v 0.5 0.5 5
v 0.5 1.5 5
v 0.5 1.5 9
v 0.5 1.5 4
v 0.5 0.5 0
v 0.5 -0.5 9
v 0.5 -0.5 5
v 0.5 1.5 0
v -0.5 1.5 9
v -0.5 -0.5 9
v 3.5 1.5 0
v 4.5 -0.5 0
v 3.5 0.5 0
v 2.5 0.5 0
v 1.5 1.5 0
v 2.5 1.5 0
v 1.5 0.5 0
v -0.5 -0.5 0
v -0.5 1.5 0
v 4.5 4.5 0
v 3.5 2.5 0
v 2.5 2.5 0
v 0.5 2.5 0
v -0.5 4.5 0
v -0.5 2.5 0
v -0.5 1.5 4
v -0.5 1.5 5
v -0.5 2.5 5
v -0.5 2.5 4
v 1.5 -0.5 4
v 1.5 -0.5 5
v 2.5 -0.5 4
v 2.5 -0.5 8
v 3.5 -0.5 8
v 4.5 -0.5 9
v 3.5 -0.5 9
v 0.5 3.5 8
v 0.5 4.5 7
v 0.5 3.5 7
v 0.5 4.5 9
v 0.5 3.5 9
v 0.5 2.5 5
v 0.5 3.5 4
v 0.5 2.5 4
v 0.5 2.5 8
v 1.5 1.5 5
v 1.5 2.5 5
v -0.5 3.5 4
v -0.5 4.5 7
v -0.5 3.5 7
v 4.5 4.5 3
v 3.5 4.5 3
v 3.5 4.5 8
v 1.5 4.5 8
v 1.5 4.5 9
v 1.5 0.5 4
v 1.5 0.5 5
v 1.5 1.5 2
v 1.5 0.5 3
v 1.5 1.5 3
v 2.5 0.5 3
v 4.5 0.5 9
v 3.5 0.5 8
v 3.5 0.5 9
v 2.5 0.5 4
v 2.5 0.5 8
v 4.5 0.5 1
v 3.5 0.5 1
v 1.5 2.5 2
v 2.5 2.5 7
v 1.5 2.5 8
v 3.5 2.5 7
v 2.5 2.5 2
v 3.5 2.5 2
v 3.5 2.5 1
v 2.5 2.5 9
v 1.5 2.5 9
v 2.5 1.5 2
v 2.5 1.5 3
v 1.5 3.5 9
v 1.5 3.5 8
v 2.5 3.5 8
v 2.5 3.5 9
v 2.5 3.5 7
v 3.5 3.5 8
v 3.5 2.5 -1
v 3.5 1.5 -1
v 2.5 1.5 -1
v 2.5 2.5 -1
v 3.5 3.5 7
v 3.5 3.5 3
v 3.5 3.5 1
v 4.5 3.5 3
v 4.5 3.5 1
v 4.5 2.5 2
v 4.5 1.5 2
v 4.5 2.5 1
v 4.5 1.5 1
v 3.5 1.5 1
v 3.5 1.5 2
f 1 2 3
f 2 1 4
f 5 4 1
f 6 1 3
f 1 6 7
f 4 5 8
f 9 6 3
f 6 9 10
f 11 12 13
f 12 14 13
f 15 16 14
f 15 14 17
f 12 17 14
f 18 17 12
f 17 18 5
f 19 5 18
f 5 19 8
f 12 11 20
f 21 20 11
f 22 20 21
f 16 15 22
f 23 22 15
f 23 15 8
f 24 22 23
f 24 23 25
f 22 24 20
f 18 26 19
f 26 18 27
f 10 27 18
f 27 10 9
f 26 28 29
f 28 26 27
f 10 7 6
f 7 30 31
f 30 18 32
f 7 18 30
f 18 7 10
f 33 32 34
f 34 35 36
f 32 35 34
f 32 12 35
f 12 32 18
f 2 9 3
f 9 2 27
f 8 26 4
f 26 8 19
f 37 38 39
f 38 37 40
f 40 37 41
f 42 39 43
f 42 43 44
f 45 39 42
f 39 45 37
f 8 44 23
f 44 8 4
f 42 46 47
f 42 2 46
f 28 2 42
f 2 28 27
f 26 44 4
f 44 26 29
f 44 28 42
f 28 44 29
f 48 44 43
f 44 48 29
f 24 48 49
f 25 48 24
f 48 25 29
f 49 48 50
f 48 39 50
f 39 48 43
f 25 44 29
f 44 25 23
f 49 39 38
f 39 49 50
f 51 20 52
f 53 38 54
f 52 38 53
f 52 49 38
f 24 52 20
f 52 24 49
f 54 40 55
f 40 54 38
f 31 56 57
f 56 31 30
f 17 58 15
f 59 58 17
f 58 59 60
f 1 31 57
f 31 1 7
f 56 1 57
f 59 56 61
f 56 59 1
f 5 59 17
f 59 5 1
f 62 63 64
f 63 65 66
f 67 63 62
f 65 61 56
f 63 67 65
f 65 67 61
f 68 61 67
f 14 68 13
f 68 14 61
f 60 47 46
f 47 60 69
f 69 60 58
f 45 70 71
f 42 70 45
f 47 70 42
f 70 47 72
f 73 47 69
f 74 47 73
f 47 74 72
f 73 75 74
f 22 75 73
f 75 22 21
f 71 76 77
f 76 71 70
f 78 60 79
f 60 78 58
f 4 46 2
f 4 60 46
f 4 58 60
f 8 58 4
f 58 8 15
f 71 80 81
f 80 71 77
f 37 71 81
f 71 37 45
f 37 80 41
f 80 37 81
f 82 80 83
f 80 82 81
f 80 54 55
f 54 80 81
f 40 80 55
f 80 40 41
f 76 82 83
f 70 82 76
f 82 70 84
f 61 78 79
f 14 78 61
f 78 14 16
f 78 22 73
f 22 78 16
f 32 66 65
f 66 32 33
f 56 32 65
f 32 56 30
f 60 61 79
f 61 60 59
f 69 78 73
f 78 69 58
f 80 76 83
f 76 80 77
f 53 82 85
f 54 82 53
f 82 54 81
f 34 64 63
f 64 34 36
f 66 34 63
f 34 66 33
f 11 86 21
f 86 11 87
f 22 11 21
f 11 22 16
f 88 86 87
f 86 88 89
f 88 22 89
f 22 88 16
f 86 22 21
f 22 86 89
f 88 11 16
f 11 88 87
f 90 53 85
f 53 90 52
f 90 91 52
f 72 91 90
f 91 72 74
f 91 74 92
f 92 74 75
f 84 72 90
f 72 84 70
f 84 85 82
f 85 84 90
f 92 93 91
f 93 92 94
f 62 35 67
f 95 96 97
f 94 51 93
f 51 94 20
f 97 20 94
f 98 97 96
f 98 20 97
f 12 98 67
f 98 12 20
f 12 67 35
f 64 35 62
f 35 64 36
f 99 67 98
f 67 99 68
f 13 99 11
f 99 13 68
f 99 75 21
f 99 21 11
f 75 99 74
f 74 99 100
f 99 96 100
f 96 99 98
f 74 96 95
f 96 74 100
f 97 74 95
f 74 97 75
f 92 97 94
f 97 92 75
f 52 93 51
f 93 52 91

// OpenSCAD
union() {
    translate([0, 0, 4.5]) cube([1, 1, 9], center=true);
    translate([0, 1, 4.5]) cube([1, 1, 9], center=true);
    translate([0, 2, 4.5]) color([1, 0, 0]) cube([1, 1, 1], center=true);
    translate([0, 3, 2.0]) cube([1, 1, 4], center=true);
    translate([0, 4, 3.5]) cube([1, 1, 7], center=true);
    translate([1, 0, 2.5]) cube([1, 1, 5], center=true);
    translate([1, 2, 2.5]) cube([1, 1, 5], center=true);
    translate([1, 3, 4.0]) cube([1, 1, 8], center=true);
    translate([1, 4, 4.5]) cube([1, 1, 9], center=true);
    translate([2, 0, 2.0]) cube([1, 1, 4], center=true);
    translate([2, 1, 1.5]) cube([1, 1, 3], center=true);
    translate([2, 2, 1.0]) cube([1, 1, 2], center=true);
    translate([2, 3, 4.5]) cube([1, 1, 9], center=true);
    translate([2, 4, 4.0]) cube([1, 1, 8], center=true);
    translate([3, 0, 4.0]) cube([1, 1, 8], center=true);
    translate([3, 2, -0.5]) color([0, 0, 1]) cube([1, 1, 1], center=true);
    translate([3, 3, 3.5]) cube([1, 1, 7], center=true);
    translate([3, 4, 4.0]) cube([1, 1, 8], center=true);
    translate([4, 0, 4.5]) cube([1, 1, 9], center=true);
    translate([4, 1, 0.5]) cube([1, 1, 1], center=true);
    translate([4, 2, 1.0]) cube([1, 1, 2], center=true);
    translate([4, 3, 0.5]) cube([1, 1, 1], center=true);
    translate([4, 4, 1.5]) cube([1, 1, 3], center=true);
}
